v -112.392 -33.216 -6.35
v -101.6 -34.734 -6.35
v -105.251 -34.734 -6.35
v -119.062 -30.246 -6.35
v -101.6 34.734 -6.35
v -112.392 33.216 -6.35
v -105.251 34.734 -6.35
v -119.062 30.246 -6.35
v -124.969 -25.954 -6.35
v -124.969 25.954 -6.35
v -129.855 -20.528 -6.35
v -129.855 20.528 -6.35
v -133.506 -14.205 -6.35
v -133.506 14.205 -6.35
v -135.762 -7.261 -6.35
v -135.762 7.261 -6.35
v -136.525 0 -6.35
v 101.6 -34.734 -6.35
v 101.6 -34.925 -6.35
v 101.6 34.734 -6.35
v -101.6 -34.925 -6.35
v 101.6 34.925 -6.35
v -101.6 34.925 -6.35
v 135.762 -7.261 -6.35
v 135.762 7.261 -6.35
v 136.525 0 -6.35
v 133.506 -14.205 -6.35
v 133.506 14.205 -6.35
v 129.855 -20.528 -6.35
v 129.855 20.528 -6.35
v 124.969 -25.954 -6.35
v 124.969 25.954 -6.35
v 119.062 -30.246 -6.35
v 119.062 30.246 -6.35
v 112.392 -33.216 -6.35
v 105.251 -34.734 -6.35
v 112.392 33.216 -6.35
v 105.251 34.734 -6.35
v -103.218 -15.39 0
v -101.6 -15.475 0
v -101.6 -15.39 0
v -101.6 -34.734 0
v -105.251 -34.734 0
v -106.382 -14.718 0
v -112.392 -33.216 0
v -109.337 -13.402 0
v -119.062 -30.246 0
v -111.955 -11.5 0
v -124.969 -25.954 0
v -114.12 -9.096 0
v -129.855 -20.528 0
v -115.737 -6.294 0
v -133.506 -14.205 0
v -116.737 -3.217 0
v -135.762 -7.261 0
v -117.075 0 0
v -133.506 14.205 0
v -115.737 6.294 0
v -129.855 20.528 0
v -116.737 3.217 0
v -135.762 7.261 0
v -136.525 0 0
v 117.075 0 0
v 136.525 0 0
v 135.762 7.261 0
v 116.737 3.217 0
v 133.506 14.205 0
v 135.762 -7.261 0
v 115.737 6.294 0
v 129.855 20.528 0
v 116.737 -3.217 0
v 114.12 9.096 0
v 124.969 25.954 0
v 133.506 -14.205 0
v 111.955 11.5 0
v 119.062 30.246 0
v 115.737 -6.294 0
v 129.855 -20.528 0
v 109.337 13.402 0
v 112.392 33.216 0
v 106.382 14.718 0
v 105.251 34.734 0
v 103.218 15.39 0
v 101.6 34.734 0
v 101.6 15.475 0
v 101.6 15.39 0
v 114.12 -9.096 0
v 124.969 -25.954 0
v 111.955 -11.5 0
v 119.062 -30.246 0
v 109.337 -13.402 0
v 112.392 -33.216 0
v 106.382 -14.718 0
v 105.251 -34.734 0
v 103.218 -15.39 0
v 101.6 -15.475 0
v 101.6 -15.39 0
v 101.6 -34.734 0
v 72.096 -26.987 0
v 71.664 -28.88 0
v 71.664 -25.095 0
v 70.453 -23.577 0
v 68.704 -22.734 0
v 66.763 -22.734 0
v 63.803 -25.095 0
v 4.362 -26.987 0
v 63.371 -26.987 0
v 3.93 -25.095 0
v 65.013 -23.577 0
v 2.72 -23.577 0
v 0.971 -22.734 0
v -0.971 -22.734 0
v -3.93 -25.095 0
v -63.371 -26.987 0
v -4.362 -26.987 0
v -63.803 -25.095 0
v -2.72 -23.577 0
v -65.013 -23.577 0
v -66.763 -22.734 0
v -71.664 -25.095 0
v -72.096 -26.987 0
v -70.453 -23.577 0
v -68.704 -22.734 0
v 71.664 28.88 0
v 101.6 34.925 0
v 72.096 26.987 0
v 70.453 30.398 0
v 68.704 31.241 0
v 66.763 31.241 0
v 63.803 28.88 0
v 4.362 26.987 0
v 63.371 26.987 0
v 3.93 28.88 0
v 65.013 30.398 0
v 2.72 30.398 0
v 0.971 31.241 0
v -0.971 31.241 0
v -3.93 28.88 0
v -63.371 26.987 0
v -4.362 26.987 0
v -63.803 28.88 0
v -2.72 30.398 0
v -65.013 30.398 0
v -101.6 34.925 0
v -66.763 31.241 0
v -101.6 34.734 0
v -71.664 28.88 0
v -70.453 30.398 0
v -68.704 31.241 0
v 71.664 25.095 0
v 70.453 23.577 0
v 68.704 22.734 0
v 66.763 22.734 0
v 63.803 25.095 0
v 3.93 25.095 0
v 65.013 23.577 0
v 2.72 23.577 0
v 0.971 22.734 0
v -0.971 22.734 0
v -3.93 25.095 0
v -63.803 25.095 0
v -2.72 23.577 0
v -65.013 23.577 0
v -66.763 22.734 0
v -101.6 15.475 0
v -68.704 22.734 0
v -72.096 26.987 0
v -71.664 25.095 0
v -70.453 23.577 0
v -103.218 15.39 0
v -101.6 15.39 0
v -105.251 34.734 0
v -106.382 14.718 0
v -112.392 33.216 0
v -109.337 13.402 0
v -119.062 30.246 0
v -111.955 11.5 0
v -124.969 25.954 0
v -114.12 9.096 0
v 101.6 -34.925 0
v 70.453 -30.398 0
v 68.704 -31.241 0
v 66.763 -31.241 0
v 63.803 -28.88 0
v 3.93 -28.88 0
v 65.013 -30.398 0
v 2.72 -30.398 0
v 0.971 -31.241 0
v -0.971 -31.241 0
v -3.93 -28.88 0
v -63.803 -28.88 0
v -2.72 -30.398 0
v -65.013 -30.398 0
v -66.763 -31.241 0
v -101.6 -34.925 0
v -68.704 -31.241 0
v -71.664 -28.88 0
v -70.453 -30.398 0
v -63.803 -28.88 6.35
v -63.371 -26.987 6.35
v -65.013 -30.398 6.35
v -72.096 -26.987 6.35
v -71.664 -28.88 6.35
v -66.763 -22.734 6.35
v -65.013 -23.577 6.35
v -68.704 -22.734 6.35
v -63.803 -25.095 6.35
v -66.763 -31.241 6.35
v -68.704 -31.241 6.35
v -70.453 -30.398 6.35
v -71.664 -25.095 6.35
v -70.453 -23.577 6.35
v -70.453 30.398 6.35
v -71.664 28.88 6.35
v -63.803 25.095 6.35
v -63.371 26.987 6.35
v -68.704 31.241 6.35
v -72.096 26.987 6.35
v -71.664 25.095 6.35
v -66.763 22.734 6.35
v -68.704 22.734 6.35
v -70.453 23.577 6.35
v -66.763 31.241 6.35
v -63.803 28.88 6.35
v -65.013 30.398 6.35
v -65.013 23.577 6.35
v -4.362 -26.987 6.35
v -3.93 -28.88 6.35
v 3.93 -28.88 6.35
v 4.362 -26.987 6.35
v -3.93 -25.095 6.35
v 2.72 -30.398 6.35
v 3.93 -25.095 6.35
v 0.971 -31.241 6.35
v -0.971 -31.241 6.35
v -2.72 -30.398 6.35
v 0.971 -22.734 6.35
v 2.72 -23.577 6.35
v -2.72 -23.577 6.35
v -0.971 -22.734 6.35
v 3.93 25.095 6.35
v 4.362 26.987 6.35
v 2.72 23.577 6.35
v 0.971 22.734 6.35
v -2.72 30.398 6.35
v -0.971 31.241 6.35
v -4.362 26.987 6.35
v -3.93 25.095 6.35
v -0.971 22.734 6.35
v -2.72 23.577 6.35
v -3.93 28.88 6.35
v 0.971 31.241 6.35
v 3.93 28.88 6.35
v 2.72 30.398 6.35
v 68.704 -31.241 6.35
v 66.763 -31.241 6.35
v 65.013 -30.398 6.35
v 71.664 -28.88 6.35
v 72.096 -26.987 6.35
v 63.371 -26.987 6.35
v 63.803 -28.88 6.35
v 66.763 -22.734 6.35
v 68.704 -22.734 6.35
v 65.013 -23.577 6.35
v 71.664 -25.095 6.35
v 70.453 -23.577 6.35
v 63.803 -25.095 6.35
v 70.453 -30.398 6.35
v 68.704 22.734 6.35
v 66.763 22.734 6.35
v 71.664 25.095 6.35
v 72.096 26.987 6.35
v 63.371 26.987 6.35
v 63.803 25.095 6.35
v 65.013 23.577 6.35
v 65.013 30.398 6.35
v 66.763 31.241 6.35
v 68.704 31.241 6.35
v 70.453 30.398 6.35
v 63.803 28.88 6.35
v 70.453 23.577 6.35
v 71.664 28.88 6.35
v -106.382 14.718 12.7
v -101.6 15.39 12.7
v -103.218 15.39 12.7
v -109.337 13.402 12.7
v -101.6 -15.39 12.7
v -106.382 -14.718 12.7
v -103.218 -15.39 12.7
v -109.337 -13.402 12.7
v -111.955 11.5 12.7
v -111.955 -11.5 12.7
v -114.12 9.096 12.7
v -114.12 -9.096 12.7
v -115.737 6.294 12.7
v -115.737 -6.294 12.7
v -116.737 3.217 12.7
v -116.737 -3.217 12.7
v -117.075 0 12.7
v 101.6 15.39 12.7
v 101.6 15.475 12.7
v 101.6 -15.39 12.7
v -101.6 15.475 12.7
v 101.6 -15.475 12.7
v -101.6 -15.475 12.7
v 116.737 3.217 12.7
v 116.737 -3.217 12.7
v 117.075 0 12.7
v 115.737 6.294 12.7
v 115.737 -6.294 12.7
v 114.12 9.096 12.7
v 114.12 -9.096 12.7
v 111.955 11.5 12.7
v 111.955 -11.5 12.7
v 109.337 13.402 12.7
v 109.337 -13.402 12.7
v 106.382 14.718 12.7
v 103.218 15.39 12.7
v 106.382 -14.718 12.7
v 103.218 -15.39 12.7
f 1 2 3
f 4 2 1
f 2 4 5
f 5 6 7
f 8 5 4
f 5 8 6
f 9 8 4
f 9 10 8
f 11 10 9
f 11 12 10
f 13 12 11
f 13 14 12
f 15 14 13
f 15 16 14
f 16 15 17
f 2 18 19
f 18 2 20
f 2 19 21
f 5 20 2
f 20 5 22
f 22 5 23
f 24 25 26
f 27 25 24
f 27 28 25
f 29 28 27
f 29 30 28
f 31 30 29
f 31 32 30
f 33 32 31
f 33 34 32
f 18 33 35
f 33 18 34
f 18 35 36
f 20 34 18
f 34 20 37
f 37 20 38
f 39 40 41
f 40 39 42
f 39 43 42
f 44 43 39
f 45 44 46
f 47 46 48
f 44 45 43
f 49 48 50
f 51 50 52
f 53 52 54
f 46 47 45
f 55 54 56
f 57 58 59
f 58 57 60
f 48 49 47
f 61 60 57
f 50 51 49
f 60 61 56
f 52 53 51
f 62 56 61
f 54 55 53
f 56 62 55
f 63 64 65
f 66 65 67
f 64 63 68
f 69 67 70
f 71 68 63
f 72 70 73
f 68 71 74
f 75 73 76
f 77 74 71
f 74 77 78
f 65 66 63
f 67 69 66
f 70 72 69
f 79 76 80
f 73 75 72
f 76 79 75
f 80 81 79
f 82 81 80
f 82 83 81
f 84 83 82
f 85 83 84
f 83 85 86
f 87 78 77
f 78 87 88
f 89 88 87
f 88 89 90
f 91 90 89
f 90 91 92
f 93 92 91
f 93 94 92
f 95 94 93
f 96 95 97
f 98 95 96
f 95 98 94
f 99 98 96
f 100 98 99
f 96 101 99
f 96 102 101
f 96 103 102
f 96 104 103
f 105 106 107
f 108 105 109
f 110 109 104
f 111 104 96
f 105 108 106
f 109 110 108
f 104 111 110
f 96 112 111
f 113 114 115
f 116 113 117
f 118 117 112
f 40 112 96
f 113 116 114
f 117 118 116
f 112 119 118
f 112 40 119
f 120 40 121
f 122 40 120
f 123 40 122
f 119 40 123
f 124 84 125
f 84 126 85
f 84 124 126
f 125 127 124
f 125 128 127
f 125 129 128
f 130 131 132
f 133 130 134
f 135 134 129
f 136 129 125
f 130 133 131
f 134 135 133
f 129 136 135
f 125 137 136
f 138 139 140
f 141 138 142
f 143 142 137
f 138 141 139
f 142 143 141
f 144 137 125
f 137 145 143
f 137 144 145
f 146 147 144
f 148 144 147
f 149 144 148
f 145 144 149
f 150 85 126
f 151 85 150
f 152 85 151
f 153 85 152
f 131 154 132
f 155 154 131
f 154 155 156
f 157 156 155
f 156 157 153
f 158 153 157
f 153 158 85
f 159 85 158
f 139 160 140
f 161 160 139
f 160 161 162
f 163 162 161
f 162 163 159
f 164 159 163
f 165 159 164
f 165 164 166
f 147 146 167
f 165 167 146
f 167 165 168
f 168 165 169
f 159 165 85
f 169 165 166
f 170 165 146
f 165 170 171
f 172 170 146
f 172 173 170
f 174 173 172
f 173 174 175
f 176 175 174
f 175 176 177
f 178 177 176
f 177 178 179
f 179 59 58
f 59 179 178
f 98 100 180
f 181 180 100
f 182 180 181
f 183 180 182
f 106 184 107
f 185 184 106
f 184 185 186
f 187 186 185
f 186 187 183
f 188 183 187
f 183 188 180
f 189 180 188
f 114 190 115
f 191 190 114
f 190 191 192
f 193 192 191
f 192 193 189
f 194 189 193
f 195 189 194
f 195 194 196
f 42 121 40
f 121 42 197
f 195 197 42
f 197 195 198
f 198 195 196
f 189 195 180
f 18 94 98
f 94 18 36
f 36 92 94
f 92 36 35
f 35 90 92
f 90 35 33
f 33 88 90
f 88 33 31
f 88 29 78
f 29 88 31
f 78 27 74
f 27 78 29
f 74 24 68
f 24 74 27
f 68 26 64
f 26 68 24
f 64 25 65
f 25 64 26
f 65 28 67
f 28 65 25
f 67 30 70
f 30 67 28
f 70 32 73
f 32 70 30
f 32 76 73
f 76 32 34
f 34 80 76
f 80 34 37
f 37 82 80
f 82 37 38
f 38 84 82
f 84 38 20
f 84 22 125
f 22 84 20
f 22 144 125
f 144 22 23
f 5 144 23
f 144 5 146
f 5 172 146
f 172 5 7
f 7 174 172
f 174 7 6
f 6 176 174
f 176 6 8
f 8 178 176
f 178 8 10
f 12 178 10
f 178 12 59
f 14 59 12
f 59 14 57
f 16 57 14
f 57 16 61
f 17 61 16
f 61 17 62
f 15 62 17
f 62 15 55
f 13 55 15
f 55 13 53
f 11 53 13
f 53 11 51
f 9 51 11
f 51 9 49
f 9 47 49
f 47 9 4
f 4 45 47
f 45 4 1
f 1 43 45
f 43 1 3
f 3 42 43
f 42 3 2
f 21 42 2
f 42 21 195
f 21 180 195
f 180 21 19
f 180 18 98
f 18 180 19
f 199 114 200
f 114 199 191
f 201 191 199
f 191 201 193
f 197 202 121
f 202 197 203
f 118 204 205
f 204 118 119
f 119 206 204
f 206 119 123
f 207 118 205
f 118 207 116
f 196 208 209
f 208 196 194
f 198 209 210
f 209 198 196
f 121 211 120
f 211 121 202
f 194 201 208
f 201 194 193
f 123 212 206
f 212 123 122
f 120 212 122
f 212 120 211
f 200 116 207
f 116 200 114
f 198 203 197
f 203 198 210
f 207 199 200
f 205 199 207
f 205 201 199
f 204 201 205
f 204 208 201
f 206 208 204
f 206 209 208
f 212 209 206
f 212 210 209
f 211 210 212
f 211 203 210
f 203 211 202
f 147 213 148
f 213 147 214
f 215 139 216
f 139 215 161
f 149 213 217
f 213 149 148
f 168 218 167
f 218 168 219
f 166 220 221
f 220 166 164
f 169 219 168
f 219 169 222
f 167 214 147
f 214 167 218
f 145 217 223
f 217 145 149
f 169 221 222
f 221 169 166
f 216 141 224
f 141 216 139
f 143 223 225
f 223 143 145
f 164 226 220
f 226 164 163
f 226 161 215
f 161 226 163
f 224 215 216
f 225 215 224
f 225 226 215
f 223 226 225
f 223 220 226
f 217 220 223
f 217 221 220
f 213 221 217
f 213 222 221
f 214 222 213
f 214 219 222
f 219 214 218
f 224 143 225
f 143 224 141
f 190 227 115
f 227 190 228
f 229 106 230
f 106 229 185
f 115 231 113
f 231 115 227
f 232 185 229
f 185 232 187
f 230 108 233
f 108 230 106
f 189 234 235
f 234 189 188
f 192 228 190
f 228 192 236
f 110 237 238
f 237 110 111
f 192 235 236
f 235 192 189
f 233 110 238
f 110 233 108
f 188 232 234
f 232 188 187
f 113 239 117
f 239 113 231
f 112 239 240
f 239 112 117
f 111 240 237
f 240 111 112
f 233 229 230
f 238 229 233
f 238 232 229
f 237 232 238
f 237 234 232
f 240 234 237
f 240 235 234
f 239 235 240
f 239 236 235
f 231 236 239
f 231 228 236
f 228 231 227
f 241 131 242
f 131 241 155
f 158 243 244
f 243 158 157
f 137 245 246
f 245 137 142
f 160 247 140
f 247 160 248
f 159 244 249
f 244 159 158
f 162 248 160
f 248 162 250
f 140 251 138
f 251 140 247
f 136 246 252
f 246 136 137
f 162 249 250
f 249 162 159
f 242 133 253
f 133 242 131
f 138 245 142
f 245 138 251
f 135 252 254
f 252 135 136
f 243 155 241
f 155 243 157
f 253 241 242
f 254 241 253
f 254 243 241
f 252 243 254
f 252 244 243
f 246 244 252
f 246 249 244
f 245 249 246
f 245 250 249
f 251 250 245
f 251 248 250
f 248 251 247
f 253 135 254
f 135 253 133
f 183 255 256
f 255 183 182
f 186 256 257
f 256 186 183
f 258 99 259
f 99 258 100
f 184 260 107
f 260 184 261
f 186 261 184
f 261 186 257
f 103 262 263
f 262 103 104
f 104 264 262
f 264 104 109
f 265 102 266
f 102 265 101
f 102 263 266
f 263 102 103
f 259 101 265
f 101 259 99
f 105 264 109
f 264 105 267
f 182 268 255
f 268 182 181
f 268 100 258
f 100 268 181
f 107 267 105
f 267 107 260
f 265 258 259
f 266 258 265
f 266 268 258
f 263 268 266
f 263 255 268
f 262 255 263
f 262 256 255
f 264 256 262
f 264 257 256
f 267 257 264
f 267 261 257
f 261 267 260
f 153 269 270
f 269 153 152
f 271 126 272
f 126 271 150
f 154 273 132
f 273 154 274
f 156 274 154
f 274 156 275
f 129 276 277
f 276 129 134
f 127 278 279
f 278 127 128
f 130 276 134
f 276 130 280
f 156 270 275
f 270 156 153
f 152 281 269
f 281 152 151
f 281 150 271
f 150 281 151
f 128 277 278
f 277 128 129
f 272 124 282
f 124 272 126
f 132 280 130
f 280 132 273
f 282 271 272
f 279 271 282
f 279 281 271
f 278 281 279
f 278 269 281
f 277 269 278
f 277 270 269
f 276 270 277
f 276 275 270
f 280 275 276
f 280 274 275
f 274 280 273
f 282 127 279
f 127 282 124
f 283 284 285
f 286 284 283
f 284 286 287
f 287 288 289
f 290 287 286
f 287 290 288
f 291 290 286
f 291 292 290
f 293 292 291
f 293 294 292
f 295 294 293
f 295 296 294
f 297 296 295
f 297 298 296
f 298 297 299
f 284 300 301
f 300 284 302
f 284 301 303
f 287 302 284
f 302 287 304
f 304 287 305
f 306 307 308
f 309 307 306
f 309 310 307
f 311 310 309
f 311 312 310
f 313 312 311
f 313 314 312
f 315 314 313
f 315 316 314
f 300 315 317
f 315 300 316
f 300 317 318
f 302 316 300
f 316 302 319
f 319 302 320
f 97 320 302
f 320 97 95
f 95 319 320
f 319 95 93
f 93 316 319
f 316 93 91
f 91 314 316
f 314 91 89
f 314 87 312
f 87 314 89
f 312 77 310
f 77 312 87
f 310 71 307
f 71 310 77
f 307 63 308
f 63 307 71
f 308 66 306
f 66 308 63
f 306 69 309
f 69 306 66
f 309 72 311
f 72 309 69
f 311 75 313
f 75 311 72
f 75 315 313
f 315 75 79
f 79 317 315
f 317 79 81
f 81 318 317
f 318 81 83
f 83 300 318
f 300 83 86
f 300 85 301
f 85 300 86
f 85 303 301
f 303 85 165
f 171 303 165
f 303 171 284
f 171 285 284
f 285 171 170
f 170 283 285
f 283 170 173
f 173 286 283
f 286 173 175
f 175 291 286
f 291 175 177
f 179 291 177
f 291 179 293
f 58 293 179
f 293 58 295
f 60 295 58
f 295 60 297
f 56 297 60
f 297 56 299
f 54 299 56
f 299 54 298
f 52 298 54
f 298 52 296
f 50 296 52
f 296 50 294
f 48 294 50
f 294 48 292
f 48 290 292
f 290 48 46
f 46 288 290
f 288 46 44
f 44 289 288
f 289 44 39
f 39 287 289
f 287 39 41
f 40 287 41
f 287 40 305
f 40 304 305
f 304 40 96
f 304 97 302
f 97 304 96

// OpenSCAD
union() {
	union() {
		union() {
			union() {
				union() {
					union() {
						union() {
							translate(v = [0, 0, -6.3500000000]) {
								linear_extrude(height = 6.3500000000) {
									union() {
										union() {
											square(center = true, size = [203.2000000000, 69.8500000000]);
											translate(v = [-101.6000000000, 0]) {
												circle(d = 69.8500000000);
											}
										}
										translate(v = [101.6000000000, 0]) {
											circle(d = 69.8500000000);
										}
									}
								}
							}
							translate(v = [-67.7333333333, -26.9875000000]) {
								linear_extrude(height = 6.3500000000) {
									circle(d = 8.7250000000);
								}
							}
						}
						translate(v = [-67.7333333333, 26.9875000000]) {
							linear_extrude(height = 6.3500000000) {
								circle(d = 8.7250000000);
							}
						}
					}
					translate(v = [0, -26.9875000000]) {
						linear_extrude(height = 6.3500000000) {
							circle(d = 8.7250000000);
						}
					}
				}
				translate(v = [0, 26.9875000000]) {
					linear_extrude(height = 6.3500000000) {
						circle(d = 8.7250000000);
					}
				}
			}
			translate(v = [67.7333333333, -26.9875000000]) {
				linear_extrude(height = 6.3500000000) {
					circle(d = 8.7250000000);
				}
			}
		}
		translate(v = [67.7333333333, 26.9875000000]) {
			linear_extrude(height = 6.3500000000) {
				circle(d = 8.7250000000);
			}
		}
	}
	linear_extrude(height = 12.7000000000) {
		union() {
			union() {
				square(center = true, size = [203.2000000000, 30.9500000000]);
				translate(v = [-101.6000000000, 0]) {
					circle(d = 30.9500000000);
				}
			}
			translate(v = [101.6000000000, 0]) {
				circle(d = 30.9500000000);
			}
		}
	}
}
